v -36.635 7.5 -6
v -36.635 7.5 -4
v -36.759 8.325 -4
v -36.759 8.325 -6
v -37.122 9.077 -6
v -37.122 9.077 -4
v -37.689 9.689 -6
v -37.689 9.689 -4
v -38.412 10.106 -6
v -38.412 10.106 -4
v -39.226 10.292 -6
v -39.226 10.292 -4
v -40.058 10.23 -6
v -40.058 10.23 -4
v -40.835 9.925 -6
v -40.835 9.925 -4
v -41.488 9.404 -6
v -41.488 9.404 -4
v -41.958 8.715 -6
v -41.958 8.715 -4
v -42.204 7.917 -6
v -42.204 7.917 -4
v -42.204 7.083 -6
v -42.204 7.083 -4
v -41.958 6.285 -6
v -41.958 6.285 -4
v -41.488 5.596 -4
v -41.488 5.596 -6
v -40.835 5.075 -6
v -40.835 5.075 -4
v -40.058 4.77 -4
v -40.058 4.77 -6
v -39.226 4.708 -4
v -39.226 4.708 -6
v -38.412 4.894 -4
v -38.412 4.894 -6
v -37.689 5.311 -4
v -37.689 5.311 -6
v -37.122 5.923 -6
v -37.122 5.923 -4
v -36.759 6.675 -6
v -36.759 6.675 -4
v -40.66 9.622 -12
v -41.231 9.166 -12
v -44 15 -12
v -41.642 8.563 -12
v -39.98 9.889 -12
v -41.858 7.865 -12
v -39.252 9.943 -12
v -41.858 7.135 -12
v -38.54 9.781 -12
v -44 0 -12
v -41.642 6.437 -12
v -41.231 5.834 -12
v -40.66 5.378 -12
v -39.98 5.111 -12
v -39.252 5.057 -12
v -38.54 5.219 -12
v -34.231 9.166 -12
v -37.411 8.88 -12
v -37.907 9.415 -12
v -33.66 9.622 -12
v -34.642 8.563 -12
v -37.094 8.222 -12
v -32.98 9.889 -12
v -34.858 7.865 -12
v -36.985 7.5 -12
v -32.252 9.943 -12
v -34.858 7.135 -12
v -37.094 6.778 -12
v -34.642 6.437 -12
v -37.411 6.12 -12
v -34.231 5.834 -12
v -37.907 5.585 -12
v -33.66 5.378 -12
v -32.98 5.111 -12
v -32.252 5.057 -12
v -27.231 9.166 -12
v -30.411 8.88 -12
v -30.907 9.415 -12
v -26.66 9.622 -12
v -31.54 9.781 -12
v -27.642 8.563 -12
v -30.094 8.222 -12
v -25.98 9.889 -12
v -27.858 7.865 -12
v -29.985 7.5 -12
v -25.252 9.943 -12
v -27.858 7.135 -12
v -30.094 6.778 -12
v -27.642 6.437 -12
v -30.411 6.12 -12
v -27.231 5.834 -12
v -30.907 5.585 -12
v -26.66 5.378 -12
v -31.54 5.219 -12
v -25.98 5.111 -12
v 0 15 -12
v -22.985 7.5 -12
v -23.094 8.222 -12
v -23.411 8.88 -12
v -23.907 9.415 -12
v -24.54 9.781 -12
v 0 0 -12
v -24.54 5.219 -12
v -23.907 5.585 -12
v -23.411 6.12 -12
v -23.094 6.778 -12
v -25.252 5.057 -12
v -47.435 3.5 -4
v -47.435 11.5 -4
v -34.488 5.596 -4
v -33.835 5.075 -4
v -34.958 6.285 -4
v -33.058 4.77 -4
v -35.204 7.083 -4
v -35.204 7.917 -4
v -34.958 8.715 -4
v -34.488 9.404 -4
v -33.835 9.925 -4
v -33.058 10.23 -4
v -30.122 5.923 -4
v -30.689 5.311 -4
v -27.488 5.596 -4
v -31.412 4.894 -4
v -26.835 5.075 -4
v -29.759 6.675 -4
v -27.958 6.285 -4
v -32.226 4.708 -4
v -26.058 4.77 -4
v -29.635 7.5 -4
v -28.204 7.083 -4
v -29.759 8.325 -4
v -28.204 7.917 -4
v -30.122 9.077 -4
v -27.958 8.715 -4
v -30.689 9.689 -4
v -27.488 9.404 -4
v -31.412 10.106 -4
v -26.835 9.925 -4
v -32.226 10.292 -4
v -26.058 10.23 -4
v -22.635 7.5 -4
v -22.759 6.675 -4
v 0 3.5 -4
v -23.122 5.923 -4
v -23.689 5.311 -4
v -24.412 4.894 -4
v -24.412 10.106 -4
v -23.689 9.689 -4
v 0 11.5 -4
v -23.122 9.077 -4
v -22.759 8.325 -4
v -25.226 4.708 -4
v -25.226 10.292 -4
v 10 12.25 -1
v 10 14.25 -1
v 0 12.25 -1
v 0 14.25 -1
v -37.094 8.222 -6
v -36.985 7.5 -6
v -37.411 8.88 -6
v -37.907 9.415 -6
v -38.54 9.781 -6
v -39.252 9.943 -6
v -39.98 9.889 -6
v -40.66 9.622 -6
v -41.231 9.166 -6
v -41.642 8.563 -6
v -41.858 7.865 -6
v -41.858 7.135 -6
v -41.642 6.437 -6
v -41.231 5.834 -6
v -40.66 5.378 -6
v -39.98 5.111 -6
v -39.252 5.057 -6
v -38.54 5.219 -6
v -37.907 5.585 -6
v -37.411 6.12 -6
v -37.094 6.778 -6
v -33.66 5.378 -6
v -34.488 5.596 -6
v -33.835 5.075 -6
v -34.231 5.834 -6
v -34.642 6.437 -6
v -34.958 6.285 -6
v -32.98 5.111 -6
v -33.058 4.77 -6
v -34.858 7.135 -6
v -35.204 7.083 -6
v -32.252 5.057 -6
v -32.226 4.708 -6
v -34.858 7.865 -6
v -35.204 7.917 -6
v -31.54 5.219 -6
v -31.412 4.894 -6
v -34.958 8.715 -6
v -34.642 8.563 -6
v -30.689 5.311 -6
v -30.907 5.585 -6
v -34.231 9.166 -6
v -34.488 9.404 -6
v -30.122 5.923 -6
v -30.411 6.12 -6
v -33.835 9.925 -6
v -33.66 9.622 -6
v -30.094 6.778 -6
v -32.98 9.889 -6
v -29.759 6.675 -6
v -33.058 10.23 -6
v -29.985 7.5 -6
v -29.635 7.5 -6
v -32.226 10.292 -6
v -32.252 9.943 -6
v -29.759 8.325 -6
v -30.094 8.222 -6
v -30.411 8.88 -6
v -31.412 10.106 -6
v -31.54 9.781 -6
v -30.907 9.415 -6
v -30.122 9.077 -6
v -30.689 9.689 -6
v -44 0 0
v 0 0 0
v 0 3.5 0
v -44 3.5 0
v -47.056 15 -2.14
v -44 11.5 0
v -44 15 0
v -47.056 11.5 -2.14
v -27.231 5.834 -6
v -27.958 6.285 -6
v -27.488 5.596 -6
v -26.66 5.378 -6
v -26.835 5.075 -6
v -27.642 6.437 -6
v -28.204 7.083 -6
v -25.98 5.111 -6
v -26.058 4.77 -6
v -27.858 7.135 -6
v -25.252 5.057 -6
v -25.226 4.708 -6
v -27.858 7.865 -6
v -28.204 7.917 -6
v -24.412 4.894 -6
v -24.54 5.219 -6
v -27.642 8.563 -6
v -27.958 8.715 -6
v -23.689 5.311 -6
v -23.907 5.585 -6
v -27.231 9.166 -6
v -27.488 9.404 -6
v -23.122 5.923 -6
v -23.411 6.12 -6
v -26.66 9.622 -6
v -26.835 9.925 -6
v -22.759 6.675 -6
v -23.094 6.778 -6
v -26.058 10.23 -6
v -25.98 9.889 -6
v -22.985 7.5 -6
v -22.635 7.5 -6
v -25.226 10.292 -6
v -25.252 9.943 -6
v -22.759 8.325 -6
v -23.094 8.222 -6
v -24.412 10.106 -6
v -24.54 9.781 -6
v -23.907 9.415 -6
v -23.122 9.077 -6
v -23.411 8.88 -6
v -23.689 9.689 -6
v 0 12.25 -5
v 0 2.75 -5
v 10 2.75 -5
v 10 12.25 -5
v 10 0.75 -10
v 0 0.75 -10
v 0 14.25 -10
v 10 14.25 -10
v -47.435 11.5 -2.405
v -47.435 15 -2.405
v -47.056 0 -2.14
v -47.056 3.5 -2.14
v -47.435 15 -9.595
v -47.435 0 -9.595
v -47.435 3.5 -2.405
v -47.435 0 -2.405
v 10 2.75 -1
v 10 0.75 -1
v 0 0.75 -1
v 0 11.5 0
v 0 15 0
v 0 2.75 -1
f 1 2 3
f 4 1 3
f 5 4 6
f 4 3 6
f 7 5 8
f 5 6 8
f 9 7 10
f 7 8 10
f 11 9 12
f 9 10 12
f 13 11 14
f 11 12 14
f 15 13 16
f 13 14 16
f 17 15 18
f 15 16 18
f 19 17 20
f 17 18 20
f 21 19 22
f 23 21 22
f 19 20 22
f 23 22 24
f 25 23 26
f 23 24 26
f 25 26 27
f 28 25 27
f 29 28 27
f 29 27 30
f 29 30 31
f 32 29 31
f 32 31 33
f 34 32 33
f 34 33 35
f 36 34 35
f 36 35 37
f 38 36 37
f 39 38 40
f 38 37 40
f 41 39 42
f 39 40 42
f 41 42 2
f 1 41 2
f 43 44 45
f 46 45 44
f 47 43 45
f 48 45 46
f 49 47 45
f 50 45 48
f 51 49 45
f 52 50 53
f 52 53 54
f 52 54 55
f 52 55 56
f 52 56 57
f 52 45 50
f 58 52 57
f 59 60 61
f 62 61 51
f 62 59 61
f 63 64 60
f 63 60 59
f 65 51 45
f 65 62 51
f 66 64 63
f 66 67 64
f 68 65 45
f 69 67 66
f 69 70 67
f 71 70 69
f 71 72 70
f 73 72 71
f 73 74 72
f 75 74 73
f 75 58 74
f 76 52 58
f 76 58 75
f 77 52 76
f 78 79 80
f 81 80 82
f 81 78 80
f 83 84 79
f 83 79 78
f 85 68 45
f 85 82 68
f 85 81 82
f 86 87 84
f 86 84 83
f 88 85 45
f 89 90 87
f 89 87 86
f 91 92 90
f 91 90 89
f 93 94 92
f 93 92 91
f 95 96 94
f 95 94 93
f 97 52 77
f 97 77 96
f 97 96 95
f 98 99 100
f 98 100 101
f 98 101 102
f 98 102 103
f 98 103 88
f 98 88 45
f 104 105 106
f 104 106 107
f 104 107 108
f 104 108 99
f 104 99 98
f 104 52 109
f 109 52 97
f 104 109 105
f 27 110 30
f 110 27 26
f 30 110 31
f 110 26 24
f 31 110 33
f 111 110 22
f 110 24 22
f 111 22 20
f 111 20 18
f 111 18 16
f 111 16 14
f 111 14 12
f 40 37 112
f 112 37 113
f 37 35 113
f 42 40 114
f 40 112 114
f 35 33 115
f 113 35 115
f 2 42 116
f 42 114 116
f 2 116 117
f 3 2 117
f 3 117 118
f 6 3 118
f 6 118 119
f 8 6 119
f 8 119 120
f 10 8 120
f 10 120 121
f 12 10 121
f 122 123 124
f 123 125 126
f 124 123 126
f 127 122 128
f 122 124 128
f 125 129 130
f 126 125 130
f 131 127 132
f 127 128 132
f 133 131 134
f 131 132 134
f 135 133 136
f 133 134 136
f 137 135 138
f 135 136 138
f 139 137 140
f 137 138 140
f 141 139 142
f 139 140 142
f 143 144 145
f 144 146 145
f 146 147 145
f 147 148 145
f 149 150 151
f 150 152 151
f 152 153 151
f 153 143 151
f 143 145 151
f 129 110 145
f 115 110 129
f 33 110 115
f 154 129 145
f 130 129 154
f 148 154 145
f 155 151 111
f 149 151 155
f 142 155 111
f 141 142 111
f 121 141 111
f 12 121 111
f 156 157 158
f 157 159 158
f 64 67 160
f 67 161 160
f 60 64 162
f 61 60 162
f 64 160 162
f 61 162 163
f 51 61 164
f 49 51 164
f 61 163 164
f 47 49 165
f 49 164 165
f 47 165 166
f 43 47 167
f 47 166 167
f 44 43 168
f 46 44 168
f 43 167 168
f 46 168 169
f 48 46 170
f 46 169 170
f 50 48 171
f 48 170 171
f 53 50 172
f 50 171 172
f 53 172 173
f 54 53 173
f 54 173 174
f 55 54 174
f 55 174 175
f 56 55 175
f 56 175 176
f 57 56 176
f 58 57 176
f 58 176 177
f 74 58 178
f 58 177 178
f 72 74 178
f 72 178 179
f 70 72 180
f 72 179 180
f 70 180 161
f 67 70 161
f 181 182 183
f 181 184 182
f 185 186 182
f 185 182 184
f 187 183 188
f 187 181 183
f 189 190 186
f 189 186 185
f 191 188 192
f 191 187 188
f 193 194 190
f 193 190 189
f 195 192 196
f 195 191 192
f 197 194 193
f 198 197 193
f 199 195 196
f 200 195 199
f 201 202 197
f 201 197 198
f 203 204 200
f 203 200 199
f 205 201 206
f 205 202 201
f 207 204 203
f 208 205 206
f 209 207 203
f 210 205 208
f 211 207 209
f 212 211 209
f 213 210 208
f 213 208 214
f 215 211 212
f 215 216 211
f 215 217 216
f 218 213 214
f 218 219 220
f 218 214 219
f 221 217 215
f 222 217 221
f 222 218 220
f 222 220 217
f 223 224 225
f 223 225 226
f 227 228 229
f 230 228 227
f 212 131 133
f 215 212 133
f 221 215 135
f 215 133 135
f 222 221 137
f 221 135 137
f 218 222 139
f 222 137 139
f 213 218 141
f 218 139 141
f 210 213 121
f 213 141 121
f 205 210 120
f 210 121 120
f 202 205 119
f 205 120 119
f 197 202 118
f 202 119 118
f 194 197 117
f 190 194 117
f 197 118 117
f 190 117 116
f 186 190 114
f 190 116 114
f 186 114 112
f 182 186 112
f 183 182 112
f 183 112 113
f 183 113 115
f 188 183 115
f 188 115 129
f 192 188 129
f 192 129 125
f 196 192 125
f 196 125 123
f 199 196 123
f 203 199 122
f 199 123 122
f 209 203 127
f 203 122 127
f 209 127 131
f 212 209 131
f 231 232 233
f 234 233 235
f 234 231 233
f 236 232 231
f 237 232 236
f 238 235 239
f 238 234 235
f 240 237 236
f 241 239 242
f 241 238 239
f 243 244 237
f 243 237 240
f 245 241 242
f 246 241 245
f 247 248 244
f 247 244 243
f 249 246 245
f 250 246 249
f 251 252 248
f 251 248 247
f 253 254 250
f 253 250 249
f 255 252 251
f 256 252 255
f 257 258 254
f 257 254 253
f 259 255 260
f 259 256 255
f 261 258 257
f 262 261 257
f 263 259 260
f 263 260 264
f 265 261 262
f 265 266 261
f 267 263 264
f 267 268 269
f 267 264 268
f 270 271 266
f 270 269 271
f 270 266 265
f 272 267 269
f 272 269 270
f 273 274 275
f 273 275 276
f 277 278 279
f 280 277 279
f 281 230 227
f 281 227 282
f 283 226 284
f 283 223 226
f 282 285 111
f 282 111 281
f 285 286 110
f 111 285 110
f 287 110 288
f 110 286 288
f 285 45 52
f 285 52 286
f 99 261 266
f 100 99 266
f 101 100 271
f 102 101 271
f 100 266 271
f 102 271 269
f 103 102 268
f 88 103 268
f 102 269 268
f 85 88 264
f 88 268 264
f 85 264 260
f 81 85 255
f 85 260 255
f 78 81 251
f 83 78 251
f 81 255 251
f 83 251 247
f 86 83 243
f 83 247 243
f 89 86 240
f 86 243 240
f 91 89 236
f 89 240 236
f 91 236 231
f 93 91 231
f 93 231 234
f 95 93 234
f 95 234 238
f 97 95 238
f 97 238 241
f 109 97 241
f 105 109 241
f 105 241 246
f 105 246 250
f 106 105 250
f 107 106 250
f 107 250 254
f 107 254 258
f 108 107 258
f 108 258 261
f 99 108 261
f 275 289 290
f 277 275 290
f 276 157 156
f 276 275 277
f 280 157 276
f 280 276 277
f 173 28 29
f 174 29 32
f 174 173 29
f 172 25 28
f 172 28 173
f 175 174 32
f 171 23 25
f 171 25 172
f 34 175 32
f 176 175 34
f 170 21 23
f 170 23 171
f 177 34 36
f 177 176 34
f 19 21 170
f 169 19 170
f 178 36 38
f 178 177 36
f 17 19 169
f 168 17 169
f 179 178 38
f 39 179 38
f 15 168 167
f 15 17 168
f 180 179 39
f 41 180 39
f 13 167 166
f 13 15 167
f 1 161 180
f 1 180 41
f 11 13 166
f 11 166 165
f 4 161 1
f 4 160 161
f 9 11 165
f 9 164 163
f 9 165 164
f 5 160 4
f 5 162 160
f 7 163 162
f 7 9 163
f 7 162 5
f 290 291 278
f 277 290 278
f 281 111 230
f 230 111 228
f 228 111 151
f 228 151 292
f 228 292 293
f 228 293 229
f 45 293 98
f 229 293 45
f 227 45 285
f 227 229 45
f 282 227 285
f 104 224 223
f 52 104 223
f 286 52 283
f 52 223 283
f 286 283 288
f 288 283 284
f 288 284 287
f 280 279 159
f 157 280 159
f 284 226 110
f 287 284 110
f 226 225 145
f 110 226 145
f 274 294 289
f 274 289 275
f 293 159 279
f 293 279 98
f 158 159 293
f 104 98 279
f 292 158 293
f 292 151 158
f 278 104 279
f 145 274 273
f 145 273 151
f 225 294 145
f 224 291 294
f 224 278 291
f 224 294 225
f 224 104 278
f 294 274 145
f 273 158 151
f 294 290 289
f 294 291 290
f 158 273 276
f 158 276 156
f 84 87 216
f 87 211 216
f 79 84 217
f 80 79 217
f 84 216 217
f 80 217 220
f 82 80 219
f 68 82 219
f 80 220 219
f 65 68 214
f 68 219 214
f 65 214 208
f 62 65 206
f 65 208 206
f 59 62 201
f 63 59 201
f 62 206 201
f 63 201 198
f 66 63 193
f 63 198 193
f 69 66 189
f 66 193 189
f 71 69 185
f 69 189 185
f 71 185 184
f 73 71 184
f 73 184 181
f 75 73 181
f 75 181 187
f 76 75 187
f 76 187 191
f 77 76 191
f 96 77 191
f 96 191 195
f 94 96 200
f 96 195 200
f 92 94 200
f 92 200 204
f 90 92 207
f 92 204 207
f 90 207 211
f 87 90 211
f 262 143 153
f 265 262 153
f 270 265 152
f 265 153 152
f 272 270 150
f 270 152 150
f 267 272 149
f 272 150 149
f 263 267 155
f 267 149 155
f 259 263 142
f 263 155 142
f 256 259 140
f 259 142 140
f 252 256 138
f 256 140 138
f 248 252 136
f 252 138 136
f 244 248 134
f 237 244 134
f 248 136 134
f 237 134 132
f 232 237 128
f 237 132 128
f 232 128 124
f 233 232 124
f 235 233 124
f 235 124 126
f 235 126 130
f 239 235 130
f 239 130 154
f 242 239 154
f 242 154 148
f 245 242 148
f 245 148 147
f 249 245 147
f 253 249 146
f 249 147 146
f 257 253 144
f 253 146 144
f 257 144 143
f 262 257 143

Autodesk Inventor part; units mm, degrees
ref_plane "YZ Plane" through (0, 0, 0) normal (1, 0, 0) x (0, 1, 0)
ref_plane "XZ Plane" through (0, 0, 0) normal (0, 1, 0) x (-1, 0, 0)
ref_plane "XY Plane" through (0, 0, 0) normal (0, 0, 1) x (1, 0, 0)
sketch "Náčrt1" plane through (0, 0, 0) normal (0, 1, 0) x (-1, 0, 0)
  line L0 (0, 0) -> (50, 0)
  line L1 (50, 0) -> (66.0697, -19.1511)
  line L2 (50, 0) -> (75, 0) construction
  line L3 (66.0697, -19.1511) -> (58.4092, -25.579)
  line L4 (0, -12) -> (0, 0)
  line L5 (58.6554, -25.3724) -> (47.4347, -12)
  line L6 (47.4347, -12) -> (0, -12)
  dimension "d0" = 50
  dimension "d2" = 25
  dimension "d3" = 50
  dimension "d4" = 10
  dimension "d5" = 12
extrude "Vysunutí1" add sketch "Náčrt1" along normal blind 15
sketch "Náčrt11" plane through (0, 0, 0) normal (1, 0, 0) x (0, 0, -1)
  line L0 (0, 0) -> (0, 15) projected
  line L1 (0, 7.5) -> (12, 7.5)
  line L2 (12, 0) -> (12, 15) projected
  line L3 (0, 3.5) -> (4, 3.5)
  line L4 (4, 3.5) -> (4, 11.5)
  line L5 (4, 11.5) -> (0, 11.5)
  line L6 (0, 11.5) -> (0, 3.5)
  point P0 (0, 7.5)
  point P1 (0, 11.5)
  dimension "d64" = 4
  dimension "d65" = 8
extrude "Vysunutí10" cut sketch "Náčrt11" against normal through all
sketch "Náčrt21" plane through (-66.0697, 0, -19.1511) normal (-0.6428, 0, -0.766) x (-0.766, 0, 0.6428)
  line L0 (0, 0) -> (0, 15) projected
  line L1 (0, 3.5) -> (-4, 3.5)
  line L2 (-4, 3.5) -> (-4, 11.5)
  line L3 (-4, 11.5) -> (0, 11.5)
  line L4 (0, 11.5) -> (0, 3.5)
  point P0 (-38.3022, 0)
  point P1 (0, 7.5)
  point P2 (0, 11.5)
  dimension "d68" = 4
  dimension "d69" = 8
extrude "Vysunutí11" cut sketch "Náčrt21" against normal through all
sketch "Náčrt30" plane through (0, 0, -12) normal (0, 0, -1) x (-1, 0, 0)
  point P0 (0, 0)
sketch "Náčrt31" plane through (0, 0, 0) normal (1, 0, 0) x (0, 0, -1)
  point P0 (0, 0)
sketch "Náčrt32" plane through (0, 0, 0) normal (0, -1, 0) x (1, 0, 0)
  line L0 (-47.4347, -12) -> (-58.6554, -25.3724) projected
  line L1 (-47.4347, -12) -> (-47.4347, 0)
  line L2 (-47.4347, -12) -> (-58.6554, -25.3724)
  line L3 (-58.6554, -25.3724) -> (-66.0697, -19.1511) projected
  line L4 (-66.0697, -19.1511) -> (-50, 0)
  line L5 (-50, 0) -> (-47.4347, 0)
  line L6 (-50, 0) -> (0, 0) projected
  point P0 (-47.4347, 0)
extrude "Vysunutí16" add sketch "Náčrt32" against normal through all
sketch "Náčrt33" plane through (0, 0, 0) normal (0, -1, 0) x (1, 0, 0)
  line L0 (-47.4347, -12) -> (-58.6554, -25.3724) projected
  line L1 (-47.4347, -4) -> (-47.4347, 0) projected
  line L2 (-47.4347, -12) -> (-47.4347, 0)
  line L3 (-66.0697, -19.1511) -> (-50, 0) projected
  line L4 (-47.4347, 0) -> (-50, 0)
  line L5 (-50, 0) -> (-66.0697, -19.1511)
  line L6 (-50, 0) -> (0, 0) projected
  line L7 (-66.0697, -19.1511) -> (-50, 0) projected
  line L8 (-58.6554, -25.3724) -> (-66.0697, -19.1511) projected
  line L9 (-47.4347, -12) -> (-58.6554, -25.3724) projected
  line L10 (0, -12) -> (-47.4347, -12) projected
  line L11 (0, 0) -> (0, -12) projected
  line L12 (-58.6554, -25.3724) -> (-66.0697, -19.1511) projected
  line L13 (-66.0697, -19.1511) -> (-58.6554, -25.3724)
  line L14 (-58.6554, -25.3724) -> (-47.4347, -12)
extrude "Vysunutí17" cut sketch "Náčrt33" against normal through all contours L0 L8 L3 L4 L1 L2
sketch "Náčrt34" plane through (0, 0, 0) normal (0, -1, 0) x (1, 0, 0)
  line L0 (-47.4347, 0) -> (-47.4347, -12) projected
  line L1 (-47.4347, 0) -> (-47.4347, -12) projected
  line L2 (0, -12) -> (-47.4347, -12) projected
  line L3 (0, 0) -> (0, -12) projected
  line L4 (-47.4347, 0) -> (0, 0) projected
  line L5 (0, -12) -> (-47.4347, -12) projected
  line L6 (-44, -12) -> (-47.4347, -9.595)
  line L7 (-44, -12) -> (-39.807, -12) construction
  line L8 (-47.4347, -9.595) -> (-47.4347, -12)
  line L9 (-44, -12) -> (-47.4347, -12)
  line L10 (0, 0) -> (-47.4347, 0) projected
  line L11 (-44, 0) -> (-47.0563, -2.14)
  line L12 (-44, 0) -> (-40.269, 0) construction
  line L13 (-47.0563, -2.14) -> (-47.4347, -2.405)
  line L14 (-47.4347, -2.405) -> (-47.4347, 0)
  line L15 (-44, 0) -> (-47.4347, 0)
  dimension "d99" = 145
  dimension "d100" = 145
extrude "Vysunutí18" cut sketch "Náčrt34" against normal through all contours L4 L11 L13 L0 | L6 L2 L0
sketch "Náčrt35" plane through (0, 3.5, -4) normal (0, 0, 1) x (1, 0, 0)
  line L0 (-47.4347, 8) -> (-47.4347, 0) projected
  line L1 (-47.4347, 4) -> (0, 4)
  line L2 (0, 10.8249) -> (0, -2.8249) projected
  circle A0 centre (-39.435, 4) radius 2.8
  circle A1 centre (-32.435, 4) radius 2.8
  circle A2 centre (-25.435, 4) radius 2.8
  point P0 (0, -3.5)
  dimension "d103" = 5.6
  dimension "d104" = 5.6
  dimension "d105" = 5.6
extrude "Vysunutí19" cut sketch "Náčrt35" against normal blind 2
sketch "Náčrt36" plane through (-39.435, 7.5, -6) normal (0, 0, 1) x (1, 0, 0)
  circle A0 centre (0, 0) radius 2.45
  point P0 (39.435, -7.5)
  dimension "d108" = 4.9
sketch "Náčrt37" plane through (-32.435, 7.5, -6) normal (0, 0, 1) x (1, 0, 0)
  circle A0 centre (0, 0) radius 2.45
  point P0 (32.435, -7.5)
  dimension "d109" = 4.9
sketch "Náčrt38" plane through (-25.435, 7.5, -6) normal (0, 0, 1) x (1, 0, 0)
  circle A0 centre (0, 0) radius 2.45
  point P0 (25.435, -7.5)
  dimension "d110" = 4.9
extrude "Vysunutí20" cut sketch "Náčrt36" against normal through all
extrude "Vysunutí21" cut sketch "Náčrt37" against normal through all
sketch "Náčrt39" plane through (0, 0, 0) normal (1, 0, 0) x (0, 0, -1)
  line L0 (0, 11.5) -> (0, 15) projected
  line L1 (12, 0) -> (12, 15) projected
  line L2 (0, 0) -> (0, 3.5) projected
  line L3 (1, 0.75) -> (10, 0.75)
  line L4 (10, 14.25) -> (1, 14.25)
  line L5 (1, 14.25) -> (1, 12.2503)
  line L6 (4, 4.7) -> (4, 10.3) projected
  line L7 (5, 12.2503) -> (1, 12.2503)
  line L8 (1, 0.75) -> (1, 2.7496)
  line L9 (1, 2.7496) -> (5, 2.7496)
  line L10 (5, 2.7496) -> (5, 12.2503)
  line L11 (10, 0.75) -> (10, 14.25)
  line L12 (4, 7.5) -> (12, 7.5)
  line L13 (12, 9.95) -> (12, 5.05) projected
  point P0 (1, 1.7498)
  point P1 (5, 7.5)
  point P2 (1, 13.2502)
  point P3 (10, 7.5)
  point P4 (5.5, 0.75)
  dimension "d119" = 13.5
extrude "Vysunutí22" add sketch "Náčrt39" along normal blind 10
extrude "Vysunutí23" cut sketch "Náčrt38" against normal through all
properties part number "SEMAFOR1"
